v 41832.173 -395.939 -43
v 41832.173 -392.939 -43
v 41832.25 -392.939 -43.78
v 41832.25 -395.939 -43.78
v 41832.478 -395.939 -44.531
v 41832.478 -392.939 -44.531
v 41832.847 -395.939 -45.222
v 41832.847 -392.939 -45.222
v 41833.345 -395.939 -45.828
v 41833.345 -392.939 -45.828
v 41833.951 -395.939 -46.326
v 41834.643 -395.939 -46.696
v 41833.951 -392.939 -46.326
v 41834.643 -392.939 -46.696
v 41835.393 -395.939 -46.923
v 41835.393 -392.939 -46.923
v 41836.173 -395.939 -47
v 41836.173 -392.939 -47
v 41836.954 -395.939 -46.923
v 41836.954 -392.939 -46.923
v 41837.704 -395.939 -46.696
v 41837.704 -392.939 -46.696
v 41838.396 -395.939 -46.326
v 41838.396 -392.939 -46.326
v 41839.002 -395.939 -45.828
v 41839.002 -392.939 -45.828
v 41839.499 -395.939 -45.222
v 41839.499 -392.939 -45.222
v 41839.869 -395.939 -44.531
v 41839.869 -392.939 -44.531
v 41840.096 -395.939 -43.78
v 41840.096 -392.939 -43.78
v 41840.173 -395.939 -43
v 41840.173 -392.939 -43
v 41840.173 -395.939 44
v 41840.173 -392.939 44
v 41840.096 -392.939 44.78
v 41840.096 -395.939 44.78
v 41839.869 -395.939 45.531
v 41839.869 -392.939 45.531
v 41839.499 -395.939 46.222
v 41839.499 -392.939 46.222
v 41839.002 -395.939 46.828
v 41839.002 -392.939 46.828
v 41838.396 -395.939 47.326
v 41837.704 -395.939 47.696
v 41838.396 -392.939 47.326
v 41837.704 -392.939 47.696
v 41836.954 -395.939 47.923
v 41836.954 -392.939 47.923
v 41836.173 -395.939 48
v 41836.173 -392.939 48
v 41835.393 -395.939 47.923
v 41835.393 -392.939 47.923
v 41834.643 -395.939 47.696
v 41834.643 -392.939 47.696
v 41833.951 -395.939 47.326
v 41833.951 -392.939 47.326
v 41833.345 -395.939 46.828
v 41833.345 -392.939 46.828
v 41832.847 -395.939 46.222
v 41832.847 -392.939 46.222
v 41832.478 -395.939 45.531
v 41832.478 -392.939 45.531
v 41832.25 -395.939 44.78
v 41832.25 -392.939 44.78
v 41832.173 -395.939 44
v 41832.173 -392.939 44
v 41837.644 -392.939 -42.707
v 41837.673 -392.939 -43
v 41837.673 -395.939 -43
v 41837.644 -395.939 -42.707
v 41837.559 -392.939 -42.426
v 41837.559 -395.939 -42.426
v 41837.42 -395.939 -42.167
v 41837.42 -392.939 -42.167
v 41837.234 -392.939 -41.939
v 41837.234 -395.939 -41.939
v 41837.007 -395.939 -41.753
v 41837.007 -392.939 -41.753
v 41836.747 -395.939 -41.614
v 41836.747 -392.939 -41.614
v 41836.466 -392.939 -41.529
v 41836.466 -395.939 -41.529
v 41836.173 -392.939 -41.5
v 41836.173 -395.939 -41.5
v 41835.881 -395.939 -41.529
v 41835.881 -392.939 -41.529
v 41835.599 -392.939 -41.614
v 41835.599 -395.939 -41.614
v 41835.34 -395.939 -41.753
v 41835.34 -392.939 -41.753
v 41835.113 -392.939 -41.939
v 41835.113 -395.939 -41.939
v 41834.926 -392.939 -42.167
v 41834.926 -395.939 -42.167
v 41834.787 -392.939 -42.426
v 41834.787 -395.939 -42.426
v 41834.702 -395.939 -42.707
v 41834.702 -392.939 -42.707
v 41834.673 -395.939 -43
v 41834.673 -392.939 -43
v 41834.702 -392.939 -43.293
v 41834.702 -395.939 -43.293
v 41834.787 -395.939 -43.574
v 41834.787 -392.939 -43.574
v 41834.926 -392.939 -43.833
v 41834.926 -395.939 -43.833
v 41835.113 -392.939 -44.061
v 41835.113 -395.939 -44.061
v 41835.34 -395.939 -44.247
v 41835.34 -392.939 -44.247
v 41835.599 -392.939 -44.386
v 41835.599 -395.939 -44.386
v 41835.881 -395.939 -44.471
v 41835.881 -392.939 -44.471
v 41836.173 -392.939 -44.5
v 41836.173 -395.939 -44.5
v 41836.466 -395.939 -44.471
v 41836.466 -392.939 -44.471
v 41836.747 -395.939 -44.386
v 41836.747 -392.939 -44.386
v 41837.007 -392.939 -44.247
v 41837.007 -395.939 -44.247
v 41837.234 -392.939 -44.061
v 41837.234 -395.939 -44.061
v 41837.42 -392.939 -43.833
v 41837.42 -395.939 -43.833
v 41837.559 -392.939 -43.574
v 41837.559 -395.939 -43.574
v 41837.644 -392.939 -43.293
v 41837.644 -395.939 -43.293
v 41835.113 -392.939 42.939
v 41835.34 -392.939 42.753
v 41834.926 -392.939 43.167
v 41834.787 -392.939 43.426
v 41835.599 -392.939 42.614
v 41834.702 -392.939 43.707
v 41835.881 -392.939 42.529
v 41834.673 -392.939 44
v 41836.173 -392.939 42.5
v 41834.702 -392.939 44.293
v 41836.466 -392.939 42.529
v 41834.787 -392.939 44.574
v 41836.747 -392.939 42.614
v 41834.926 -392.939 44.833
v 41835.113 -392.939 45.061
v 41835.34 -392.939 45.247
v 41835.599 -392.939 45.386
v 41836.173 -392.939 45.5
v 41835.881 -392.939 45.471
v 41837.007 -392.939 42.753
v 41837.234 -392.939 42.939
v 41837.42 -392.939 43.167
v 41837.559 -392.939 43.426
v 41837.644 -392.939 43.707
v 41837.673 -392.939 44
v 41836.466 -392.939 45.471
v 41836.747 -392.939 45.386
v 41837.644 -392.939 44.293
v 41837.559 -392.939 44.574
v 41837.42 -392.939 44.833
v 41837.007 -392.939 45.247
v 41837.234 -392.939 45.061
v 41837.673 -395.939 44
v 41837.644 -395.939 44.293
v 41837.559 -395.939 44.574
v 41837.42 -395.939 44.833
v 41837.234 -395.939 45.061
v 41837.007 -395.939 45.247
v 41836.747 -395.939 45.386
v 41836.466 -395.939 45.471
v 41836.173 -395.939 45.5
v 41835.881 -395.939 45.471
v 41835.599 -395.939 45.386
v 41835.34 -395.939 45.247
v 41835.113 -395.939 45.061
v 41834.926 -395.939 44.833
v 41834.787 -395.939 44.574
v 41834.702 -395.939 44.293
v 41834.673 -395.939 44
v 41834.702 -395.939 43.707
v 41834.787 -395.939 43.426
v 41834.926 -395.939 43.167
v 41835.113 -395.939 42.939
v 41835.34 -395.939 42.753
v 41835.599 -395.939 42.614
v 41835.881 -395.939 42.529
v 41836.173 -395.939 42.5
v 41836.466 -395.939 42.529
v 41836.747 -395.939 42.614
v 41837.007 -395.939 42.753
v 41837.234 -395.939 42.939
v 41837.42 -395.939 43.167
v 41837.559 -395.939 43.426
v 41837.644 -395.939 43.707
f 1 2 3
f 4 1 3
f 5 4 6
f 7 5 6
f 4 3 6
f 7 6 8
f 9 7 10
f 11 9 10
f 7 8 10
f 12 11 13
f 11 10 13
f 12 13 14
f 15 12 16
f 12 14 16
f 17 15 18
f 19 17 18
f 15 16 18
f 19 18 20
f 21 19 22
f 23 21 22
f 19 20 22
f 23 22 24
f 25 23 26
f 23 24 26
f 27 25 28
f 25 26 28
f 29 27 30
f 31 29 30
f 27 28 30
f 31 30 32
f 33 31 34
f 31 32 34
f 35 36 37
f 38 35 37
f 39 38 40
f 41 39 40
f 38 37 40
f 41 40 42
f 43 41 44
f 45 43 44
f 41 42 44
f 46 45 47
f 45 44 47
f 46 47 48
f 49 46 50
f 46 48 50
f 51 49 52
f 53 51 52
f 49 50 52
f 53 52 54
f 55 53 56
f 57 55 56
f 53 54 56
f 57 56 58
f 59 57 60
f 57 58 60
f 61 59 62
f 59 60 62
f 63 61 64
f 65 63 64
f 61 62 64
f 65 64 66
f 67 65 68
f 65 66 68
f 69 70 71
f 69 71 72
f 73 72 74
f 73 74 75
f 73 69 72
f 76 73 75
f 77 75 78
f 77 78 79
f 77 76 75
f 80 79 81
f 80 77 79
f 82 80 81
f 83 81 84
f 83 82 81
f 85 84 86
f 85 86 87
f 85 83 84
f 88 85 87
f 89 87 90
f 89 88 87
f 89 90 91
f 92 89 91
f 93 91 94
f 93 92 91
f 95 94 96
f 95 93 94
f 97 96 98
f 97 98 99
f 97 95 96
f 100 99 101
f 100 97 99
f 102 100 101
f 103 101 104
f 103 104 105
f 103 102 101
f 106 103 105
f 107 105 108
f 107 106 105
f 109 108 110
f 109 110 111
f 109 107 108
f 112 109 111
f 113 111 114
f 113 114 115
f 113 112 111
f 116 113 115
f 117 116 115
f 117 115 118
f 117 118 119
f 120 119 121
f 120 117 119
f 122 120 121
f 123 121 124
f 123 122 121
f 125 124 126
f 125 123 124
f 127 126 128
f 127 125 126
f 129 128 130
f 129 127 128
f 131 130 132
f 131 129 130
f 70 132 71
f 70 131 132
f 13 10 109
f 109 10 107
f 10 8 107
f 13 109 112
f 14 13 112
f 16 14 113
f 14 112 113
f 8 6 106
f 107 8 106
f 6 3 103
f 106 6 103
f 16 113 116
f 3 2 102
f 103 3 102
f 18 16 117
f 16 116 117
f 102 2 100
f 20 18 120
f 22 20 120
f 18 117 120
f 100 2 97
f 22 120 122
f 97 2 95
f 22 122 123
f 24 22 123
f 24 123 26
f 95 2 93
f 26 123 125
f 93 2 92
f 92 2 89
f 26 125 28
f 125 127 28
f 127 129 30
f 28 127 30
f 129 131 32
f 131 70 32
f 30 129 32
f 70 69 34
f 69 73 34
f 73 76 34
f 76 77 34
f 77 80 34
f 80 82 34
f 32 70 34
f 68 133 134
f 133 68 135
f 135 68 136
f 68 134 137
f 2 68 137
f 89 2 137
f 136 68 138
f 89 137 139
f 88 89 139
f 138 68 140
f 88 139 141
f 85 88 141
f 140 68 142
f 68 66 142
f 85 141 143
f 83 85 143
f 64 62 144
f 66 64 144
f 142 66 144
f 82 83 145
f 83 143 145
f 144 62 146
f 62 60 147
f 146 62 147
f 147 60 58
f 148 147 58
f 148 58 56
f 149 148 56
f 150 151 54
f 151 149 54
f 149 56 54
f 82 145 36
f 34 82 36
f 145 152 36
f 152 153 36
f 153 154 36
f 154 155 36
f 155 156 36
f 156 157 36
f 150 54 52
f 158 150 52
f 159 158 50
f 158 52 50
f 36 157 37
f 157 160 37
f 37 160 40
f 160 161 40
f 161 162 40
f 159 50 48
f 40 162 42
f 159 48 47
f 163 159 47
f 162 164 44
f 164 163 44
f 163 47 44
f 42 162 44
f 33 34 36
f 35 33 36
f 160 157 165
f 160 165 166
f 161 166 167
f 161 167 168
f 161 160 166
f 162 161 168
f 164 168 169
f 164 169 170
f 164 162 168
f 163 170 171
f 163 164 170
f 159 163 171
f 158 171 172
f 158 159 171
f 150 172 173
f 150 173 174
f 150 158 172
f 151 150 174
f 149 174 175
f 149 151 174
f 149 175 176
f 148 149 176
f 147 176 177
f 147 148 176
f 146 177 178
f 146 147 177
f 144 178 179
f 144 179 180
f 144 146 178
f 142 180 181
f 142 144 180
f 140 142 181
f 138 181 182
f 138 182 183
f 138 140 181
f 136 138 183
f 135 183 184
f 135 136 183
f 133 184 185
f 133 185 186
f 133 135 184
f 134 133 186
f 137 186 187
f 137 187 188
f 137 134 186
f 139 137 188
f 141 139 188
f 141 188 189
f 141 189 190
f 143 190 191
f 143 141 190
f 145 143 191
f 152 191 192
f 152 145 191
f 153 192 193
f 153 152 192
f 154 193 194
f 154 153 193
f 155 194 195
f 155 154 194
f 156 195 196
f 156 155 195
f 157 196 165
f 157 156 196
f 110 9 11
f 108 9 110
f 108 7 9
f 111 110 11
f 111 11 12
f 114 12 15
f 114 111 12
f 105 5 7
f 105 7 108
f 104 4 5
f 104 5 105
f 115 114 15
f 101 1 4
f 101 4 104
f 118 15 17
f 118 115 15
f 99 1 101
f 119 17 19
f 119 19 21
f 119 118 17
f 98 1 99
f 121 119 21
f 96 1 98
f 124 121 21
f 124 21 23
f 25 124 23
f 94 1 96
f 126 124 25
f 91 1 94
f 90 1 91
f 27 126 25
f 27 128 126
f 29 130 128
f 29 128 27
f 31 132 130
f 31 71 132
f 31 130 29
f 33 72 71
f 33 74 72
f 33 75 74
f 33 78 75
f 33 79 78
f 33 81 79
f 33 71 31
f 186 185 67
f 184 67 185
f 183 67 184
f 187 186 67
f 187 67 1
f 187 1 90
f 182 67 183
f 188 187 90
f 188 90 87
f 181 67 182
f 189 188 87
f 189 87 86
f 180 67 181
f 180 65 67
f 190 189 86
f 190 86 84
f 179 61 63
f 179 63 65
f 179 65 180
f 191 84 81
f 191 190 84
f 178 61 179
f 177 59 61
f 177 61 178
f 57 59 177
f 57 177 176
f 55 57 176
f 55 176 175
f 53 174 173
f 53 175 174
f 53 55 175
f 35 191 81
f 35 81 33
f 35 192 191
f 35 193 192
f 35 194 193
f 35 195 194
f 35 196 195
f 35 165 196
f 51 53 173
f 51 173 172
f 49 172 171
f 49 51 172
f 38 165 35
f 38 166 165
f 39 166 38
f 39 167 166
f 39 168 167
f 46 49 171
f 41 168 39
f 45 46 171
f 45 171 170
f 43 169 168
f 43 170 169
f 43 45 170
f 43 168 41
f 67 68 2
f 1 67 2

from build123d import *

# Parameters (mm, degrees)
CROQUIS1_R                 = 1.5
SALIENTE_EXTRUIR1_DEPTH    = 3
S_LIDO_MOVER_COPIAR1_ANGLE = 90


with BuildPart() as part:
    # Croquis1 → Saliente-Extruir1 (new body)
    with BuildSketch(Plane.XY):
        with BuildLine():
            Line((41840.173257962, -436.939495492), (41840.173257962, -351.939495492))
            ThreePointArc((41840.173257962, -351.939495492), (41836.173257962, -347.939495492), (41832.173257962, -351.939495492))
            Line((41832.173257962, -351.939495492), (41832.173257962, -436.939495492))
            Line((41832.173257962, -436.939495492), (41832.173257962, -438.939495492))
            ThreePointArc((41832.173257962, -438.939495492), (41836.173257962, -442.939495492), (41840.173257962, -438.939495492))
            Line((41840.173257962, -438.939495492), (41840.173257962, -436.939495492))
        make_face()
        with Locations((41836.173257962, -351.939495492)):
            Circle(CROQUIS1_R, mode=Mode.SUBTRACT)
        with Locations((41836.173257962, -438.939495492)):
            Circle(CROQUIS1_R, mode=Mode.SUBTRACT)
    extrude(amount=SALIENTE_EXTRUIR1_DEPTH)


with BuildPart() as part_1:
    # Sólido-Mover/Copiar1: moved
    add(part.part.rotate(Axis((0, -394.439495492, 1.5), (1, 0, 0)), S_LIDO_MOVER_COPIAR1_ANGLE))


solid = part_1.part
